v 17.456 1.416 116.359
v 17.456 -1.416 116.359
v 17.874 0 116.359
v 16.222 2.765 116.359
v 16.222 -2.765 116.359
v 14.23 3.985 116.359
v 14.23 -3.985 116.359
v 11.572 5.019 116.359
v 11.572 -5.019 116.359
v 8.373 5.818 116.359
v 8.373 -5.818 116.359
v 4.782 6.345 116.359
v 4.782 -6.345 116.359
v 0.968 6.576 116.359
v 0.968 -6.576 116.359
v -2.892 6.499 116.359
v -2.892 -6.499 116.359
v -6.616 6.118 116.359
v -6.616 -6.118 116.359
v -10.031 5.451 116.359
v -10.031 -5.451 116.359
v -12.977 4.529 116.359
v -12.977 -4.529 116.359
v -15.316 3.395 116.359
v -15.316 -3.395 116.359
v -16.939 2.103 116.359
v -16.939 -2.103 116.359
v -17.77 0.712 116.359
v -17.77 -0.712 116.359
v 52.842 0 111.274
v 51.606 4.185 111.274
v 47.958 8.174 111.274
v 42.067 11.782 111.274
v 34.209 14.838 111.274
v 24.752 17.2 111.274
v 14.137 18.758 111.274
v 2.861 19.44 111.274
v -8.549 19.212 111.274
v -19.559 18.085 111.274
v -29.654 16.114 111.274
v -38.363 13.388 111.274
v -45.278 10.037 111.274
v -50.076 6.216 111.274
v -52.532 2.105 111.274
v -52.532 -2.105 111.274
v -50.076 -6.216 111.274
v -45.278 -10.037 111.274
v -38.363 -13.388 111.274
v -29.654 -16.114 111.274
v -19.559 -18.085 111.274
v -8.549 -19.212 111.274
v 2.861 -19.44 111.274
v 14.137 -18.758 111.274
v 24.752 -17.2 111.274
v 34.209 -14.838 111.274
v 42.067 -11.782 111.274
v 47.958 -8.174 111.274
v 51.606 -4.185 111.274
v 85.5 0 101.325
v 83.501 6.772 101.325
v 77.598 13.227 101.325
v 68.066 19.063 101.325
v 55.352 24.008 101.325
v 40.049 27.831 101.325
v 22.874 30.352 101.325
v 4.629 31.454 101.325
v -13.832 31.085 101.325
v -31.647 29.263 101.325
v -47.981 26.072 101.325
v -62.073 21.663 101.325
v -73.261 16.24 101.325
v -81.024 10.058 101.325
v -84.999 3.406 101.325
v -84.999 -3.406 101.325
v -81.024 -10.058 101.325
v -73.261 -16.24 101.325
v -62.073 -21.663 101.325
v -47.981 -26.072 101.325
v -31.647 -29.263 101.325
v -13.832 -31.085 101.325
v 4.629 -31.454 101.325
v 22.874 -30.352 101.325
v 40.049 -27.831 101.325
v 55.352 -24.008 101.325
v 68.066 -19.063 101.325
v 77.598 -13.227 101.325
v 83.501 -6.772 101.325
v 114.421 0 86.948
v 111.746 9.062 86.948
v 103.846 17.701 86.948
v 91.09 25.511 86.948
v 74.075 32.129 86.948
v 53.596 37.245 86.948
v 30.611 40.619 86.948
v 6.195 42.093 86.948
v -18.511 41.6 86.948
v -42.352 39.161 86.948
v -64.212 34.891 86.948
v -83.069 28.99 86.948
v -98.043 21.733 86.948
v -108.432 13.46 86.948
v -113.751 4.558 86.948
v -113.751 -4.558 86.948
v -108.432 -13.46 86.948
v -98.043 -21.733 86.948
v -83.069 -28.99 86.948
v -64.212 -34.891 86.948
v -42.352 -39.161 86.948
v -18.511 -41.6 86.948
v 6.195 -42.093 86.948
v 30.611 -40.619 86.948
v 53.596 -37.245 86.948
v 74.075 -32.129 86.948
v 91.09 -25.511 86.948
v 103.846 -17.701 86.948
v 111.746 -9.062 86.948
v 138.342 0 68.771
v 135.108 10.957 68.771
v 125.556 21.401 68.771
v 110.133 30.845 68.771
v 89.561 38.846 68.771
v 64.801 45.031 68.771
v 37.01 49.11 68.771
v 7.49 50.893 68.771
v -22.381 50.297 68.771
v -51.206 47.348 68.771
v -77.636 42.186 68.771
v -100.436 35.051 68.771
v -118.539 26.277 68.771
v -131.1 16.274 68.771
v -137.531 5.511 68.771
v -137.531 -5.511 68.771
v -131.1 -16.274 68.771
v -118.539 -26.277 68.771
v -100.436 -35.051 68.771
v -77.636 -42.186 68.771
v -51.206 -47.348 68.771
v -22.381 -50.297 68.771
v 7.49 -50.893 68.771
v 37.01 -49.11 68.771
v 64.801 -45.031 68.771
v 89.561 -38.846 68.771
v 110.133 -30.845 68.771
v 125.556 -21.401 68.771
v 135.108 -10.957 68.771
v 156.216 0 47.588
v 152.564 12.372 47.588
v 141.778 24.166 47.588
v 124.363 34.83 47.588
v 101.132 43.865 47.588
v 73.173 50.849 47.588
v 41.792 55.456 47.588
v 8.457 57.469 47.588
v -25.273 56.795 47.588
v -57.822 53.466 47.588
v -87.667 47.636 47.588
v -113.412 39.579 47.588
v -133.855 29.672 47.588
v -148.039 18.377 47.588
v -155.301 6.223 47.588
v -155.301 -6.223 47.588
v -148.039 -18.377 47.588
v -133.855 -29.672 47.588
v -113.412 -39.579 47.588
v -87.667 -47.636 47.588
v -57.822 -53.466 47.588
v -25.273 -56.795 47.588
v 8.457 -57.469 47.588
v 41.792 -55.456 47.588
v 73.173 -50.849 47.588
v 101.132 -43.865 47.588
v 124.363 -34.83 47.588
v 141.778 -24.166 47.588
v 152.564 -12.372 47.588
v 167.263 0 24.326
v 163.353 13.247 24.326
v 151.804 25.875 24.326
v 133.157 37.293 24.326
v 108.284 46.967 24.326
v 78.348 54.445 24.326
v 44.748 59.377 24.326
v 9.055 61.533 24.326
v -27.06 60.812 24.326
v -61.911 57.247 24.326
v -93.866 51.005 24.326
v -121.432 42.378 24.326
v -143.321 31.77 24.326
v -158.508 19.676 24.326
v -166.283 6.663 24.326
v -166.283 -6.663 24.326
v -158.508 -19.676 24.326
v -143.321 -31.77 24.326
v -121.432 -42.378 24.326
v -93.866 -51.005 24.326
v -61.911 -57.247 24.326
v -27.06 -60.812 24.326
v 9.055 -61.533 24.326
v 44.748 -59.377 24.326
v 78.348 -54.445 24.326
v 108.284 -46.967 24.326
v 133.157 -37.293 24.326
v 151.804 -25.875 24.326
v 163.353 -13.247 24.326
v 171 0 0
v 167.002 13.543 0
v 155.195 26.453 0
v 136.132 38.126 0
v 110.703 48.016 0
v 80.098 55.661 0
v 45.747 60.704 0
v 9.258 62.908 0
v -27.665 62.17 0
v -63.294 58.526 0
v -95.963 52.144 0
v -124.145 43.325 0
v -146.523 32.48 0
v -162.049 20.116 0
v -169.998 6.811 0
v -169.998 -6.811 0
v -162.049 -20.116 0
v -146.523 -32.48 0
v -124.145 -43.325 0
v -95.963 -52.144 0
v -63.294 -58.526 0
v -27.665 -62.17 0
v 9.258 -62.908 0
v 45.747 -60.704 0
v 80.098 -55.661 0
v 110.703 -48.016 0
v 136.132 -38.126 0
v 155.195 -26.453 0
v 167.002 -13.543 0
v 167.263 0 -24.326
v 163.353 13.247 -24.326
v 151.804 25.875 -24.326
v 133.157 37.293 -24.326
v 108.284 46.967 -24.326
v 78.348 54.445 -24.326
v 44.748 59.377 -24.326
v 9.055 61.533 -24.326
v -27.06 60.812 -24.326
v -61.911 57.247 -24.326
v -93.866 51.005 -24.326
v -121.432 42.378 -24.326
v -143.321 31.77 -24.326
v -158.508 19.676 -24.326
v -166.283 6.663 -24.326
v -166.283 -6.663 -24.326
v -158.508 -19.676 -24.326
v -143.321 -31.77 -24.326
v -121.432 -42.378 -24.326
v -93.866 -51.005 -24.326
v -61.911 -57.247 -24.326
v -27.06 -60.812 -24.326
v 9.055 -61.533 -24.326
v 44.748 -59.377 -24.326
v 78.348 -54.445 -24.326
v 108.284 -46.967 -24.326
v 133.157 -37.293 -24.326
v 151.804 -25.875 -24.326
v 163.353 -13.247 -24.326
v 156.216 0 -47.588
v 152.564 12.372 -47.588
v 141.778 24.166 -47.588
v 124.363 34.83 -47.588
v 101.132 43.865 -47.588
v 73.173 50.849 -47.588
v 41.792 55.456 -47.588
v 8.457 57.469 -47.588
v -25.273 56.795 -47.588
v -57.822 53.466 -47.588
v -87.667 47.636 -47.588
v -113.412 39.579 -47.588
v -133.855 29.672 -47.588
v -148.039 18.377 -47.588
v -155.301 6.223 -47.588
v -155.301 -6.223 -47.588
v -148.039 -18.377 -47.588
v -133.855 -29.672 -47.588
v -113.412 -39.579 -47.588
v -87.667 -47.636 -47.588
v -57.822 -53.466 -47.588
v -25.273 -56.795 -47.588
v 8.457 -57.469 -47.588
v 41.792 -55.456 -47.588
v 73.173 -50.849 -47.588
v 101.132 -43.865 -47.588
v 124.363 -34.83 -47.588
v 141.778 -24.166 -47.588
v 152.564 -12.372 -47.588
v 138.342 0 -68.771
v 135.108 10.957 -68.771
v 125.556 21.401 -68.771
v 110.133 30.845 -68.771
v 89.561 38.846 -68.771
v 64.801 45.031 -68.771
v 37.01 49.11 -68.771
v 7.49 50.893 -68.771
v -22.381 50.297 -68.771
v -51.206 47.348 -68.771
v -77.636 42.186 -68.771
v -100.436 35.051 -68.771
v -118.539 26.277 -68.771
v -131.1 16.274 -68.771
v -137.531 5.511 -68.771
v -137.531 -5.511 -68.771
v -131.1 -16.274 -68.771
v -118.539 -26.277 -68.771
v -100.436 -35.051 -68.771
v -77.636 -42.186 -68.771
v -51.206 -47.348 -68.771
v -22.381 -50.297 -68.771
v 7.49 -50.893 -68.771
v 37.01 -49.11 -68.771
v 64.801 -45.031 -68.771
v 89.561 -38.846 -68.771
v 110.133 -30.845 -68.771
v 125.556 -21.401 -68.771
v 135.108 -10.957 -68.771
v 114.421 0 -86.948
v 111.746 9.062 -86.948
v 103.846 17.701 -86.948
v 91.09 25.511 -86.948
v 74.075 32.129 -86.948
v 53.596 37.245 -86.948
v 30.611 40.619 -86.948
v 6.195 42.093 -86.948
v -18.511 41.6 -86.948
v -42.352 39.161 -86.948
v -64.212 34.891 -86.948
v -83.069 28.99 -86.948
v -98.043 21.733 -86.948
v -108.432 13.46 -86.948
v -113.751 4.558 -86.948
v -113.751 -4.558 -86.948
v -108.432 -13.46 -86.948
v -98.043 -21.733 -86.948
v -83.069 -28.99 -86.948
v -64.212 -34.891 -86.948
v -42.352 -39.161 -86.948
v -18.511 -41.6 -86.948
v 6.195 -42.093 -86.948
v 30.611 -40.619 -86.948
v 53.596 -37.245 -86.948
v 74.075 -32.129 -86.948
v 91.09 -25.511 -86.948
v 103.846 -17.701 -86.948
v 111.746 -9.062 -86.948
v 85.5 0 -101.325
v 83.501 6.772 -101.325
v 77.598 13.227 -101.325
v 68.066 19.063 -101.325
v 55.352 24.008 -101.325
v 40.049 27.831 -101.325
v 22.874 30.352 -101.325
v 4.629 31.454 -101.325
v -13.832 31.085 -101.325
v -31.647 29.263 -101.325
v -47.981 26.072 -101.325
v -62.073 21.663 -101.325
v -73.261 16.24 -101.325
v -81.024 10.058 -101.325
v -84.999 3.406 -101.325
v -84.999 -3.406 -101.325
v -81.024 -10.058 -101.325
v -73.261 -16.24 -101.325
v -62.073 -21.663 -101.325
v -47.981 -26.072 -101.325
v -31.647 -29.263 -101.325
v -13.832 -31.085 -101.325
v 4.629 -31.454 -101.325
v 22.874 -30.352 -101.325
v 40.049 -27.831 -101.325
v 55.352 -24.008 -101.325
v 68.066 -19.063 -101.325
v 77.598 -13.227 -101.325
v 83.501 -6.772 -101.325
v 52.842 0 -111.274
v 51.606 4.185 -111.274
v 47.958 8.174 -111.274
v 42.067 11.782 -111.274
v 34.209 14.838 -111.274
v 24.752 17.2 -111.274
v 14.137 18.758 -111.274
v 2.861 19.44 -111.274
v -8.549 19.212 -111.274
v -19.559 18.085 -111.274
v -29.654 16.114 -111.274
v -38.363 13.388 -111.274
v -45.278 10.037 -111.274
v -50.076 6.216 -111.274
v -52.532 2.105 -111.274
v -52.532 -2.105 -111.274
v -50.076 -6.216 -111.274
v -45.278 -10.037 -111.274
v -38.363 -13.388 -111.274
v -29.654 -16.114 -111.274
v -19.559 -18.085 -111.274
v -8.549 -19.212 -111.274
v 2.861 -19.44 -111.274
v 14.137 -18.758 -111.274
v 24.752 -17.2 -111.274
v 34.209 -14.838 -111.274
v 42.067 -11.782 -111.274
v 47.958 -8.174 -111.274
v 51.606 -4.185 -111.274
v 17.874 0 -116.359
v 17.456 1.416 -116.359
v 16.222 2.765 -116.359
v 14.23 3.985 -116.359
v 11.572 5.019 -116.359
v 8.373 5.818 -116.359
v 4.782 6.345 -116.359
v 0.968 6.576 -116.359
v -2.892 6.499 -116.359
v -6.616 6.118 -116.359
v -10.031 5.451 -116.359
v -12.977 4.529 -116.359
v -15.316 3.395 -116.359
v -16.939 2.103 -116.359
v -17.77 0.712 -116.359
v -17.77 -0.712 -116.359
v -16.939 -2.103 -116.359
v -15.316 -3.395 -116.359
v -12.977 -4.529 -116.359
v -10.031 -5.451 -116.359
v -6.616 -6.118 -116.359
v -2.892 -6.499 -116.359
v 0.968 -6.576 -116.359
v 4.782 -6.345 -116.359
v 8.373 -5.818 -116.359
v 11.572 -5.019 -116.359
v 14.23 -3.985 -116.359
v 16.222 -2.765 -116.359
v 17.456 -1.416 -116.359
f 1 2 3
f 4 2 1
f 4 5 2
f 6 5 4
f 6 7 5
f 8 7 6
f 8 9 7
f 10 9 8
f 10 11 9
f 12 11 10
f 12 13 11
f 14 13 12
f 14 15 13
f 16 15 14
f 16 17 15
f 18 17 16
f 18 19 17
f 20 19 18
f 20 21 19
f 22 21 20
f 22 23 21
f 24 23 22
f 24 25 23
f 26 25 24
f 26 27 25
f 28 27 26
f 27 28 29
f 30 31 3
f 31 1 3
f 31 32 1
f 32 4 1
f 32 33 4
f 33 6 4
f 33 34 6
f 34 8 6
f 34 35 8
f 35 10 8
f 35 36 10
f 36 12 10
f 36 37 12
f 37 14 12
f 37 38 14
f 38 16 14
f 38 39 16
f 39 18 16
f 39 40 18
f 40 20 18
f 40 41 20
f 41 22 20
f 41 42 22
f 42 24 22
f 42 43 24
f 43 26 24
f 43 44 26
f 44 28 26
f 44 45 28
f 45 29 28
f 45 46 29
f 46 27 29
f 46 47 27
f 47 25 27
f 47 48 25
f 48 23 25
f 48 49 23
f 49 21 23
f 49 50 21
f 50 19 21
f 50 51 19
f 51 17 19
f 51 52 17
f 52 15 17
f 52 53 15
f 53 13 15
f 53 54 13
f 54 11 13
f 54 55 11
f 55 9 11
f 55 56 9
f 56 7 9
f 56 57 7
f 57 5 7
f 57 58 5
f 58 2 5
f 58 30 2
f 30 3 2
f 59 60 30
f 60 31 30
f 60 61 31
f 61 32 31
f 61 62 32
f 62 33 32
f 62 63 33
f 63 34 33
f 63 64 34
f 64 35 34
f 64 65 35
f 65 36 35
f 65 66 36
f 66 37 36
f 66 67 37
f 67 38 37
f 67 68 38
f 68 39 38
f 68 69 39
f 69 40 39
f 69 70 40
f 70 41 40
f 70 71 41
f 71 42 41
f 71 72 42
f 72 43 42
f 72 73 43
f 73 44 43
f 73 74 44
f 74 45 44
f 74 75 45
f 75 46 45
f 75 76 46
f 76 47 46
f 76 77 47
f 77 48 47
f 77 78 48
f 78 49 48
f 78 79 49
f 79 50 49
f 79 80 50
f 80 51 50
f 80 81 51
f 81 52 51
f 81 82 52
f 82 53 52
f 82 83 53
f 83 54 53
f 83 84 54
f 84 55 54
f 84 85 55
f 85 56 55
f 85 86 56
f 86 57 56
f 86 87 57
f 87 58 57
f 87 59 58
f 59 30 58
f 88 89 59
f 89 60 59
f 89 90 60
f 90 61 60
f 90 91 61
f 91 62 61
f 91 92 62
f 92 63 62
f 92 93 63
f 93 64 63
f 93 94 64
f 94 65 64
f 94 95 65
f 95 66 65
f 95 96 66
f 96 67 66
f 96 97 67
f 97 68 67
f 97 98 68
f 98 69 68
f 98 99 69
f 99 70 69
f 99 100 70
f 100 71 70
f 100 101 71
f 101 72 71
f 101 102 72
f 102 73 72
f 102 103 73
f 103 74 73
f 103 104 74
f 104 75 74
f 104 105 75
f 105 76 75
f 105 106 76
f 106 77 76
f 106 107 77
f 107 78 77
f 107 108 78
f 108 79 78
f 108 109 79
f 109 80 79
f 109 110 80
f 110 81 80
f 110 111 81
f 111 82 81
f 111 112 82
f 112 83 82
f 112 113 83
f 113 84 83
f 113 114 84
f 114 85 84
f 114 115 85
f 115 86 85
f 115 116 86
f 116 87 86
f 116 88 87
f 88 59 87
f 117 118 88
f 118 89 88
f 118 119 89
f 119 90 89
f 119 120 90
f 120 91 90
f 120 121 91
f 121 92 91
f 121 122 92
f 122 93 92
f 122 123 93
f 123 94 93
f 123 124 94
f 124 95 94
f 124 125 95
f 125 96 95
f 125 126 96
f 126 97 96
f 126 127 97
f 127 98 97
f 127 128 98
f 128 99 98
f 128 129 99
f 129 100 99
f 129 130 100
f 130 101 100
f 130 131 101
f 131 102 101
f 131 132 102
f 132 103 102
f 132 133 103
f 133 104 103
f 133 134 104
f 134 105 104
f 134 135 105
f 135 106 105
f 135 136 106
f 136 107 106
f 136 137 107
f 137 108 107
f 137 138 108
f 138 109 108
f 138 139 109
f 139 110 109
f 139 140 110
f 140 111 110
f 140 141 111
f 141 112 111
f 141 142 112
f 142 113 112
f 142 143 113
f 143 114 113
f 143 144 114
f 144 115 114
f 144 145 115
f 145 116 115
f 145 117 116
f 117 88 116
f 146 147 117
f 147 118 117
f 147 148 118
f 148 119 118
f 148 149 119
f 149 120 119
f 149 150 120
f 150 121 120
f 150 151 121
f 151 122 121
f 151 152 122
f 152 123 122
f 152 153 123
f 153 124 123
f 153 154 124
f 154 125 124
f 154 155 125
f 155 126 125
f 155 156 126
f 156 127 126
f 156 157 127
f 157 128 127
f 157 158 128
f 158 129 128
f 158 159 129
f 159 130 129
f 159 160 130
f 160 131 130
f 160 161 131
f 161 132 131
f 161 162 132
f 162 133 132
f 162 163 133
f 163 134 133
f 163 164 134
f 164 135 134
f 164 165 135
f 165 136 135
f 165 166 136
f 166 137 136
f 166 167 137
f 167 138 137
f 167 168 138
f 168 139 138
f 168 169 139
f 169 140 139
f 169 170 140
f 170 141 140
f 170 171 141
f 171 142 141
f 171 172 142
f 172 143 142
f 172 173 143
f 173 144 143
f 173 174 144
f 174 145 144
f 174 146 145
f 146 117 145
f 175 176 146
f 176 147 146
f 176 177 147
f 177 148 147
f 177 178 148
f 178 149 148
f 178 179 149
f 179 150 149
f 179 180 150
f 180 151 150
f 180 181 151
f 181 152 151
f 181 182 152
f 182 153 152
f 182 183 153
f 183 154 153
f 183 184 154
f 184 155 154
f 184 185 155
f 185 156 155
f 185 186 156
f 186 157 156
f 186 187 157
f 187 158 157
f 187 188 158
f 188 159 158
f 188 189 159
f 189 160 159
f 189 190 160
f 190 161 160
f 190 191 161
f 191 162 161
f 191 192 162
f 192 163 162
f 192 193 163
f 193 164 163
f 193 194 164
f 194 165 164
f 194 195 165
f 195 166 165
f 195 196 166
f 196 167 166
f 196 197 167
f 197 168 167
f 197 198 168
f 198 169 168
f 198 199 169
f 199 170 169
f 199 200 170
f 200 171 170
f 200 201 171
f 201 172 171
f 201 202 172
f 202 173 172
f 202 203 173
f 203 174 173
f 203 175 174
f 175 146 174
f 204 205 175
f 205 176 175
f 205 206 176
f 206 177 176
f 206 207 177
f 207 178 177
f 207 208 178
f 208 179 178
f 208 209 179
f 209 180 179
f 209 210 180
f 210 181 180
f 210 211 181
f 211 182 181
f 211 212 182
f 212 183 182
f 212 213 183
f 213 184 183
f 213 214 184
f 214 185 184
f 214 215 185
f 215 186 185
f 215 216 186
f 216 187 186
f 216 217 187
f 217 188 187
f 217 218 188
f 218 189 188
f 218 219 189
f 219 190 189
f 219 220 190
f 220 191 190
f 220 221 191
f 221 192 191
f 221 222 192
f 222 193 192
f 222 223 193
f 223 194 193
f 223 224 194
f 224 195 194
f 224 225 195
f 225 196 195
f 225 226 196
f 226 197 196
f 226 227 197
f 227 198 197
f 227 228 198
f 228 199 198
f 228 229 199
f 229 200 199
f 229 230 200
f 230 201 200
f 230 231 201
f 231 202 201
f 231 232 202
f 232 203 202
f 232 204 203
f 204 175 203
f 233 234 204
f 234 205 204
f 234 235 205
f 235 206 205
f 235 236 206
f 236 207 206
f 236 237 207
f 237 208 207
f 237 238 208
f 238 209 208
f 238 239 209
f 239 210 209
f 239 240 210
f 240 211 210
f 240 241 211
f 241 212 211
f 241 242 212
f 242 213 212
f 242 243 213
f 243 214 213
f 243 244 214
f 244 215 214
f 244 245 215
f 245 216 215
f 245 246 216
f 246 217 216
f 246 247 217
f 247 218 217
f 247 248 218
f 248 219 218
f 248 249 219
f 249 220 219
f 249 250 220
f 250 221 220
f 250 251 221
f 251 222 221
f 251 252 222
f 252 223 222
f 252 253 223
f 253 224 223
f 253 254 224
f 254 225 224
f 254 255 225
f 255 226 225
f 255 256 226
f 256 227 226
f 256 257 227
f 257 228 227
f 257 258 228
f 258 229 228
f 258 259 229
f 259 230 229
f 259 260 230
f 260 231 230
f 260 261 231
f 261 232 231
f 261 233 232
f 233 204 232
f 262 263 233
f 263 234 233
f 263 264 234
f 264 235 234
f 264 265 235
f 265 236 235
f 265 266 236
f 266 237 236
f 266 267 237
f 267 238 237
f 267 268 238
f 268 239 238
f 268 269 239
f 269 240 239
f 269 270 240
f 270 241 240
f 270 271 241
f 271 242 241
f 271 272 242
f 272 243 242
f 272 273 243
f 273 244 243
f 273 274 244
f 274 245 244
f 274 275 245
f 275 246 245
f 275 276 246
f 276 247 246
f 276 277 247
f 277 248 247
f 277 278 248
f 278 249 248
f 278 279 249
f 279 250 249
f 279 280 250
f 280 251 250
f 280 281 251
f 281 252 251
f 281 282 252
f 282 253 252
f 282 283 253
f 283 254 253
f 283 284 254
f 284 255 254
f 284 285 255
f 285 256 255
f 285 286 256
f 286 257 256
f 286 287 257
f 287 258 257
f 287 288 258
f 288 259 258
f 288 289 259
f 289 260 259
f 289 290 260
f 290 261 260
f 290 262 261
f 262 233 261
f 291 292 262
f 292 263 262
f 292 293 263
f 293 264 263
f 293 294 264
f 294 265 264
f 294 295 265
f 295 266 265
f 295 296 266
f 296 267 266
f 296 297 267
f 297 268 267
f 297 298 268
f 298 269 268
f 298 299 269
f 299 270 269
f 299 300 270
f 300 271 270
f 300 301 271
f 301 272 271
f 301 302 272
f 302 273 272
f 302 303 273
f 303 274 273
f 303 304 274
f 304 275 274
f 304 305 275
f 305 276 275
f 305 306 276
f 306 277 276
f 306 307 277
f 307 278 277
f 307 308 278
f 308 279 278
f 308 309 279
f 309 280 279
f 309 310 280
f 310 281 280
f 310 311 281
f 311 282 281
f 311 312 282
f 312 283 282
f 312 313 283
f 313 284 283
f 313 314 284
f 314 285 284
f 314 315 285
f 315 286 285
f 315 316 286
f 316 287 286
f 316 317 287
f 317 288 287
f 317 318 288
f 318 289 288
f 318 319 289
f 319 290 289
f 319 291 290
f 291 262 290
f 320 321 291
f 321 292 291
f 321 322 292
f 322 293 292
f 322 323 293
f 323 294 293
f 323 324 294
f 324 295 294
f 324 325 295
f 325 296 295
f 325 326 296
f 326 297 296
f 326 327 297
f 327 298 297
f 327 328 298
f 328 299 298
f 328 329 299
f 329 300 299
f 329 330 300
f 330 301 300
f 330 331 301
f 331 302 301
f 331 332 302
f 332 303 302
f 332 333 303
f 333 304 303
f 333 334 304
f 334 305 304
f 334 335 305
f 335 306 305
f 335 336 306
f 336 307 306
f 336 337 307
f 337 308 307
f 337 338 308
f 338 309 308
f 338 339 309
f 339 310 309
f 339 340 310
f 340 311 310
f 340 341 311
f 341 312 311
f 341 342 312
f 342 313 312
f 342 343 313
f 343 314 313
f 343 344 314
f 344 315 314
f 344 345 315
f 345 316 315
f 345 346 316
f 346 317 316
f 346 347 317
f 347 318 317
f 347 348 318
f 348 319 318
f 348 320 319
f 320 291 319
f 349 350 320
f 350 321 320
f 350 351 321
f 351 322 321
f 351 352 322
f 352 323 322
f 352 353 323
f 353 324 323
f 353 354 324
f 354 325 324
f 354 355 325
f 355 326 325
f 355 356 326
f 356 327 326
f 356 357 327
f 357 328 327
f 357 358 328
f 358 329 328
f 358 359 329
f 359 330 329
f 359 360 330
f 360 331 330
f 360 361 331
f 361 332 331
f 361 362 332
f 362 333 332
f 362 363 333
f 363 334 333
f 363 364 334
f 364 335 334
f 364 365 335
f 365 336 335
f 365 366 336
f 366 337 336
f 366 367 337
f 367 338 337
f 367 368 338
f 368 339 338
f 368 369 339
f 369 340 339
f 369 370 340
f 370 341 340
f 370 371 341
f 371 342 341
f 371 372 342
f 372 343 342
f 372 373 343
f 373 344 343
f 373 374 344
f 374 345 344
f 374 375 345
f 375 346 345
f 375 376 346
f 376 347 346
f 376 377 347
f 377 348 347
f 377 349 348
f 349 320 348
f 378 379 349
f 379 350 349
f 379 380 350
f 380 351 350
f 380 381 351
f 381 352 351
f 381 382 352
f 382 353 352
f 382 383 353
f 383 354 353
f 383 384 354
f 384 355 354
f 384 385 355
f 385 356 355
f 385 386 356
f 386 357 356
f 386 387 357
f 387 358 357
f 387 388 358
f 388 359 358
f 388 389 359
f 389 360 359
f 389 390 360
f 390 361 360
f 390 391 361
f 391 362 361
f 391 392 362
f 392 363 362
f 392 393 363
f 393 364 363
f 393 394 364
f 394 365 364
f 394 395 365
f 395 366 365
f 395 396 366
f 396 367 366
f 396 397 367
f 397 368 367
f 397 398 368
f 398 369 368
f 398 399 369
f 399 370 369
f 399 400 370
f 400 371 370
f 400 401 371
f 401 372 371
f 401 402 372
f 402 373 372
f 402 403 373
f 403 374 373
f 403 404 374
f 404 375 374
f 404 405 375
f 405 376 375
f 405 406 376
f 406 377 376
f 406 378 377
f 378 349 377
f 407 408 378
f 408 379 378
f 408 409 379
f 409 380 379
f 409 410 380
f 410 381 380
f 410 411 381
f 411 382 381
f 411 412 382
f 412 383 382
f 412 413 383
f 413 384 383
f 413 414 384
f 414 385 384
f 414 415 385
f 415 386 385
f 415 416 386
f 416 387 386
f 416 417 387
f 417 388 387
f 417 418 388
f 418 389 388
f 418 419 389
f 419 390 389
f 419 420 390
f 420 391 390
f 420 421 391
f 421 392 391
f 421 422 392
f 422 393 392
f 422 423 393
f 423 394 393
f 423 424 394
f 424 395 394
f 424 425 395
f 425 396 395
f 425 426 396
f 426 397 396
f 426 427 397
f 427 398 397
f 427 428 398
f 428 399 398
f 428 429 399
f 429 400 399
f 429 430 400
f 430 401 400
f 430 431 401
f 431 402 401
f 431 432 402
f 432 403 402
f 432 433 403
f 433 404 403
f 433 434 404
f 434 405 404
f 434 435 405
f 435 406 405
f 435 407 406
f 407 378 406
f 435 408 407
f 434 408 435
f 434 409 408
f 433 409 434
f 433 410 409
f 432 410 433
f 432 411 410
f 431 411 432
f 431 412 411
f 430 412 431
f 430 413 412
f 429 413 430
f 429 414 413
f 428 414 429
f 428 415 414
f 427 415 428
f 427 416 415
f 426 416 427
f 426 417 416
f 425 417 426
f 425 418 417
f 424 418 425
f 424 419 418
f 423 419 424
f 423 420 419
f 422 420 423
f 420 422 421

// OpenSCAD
// Generated by SolidPython 1.0.1 on 2020-07-29 00:46:53


scale(v = [19, 7, 13]) {
	sphere(r = 9);
}
/***********************************************
*********      SolidPython code:      **********
************************************************
 
# import packages: SolidPython
from solid import *
from solid.utils import *
from itertools import chain, combinations, permutations


class Resize:

    def __init__(self, scad_file):
        self.scad_file = scad_file
        #self.scad_file = import_scad(scad_file)
        # cone/cylinder param:
        self.r1 = 0
        self.r2 = 0
        self.h = 0
        # rectangular prism param:
        self.w = 0
        self.l = 0
        # ellipse param:
        self.r = 0

    # import OpenScad code (file name corresponds to shape)


    # classify shape + parameters
    def assign(self, param1, param2, param3):
        if self.scad_file == 'cone.scad':
            self.r1 = param1
            self.r2 = param2
            self.h = param3
        elif self.scad_file == 'cylinder.scad':
            self.r1 = param1
            self.r2 = param2
            self.h = param3
        elif self.scad_file == 'rectangularPrism.scad':
            self.h = param1
            self.l = param2
            self.w = param3
        else:
            self.r = param1
            self.h = param2

    # resize parameters
    def iterate(self):
        x = range(3, 20, 2)
        i = 1
        if self.scad_file == 'cone.scad':
            tempList = list(permutations(x, 2))
            for temp in tempList:
                param1 = temp[0]
                param2 = temp[1]
                filepath = 'produced_scad_files/' + 'cone' + str(param1) + '_' + str(param2) + '_' + '.scad'
                scad_render_to_file(cylinder(h=param1, r1=param2, r2=0), filepath)

        elif self.scad_file == 'cylinder.scad':
            tempList = list(permutations(x, 3))
            for temp in tempList:
                param1 = temp[0]
                param2 = temp[1]
                filepath = 'produced_scad_files/' + 'cylinder' + str(param1) + '_' + str(param2) + '_' + '.scad'
                scad_render_to_file(cylinder(h=param1, r1=param2, r2=param2), filepath)

        elif self.scad_file == 'rectangularPrism.scad':
            tempList = list(permutations(x, 3))
            for temp in tempList:
                param1 = temp[0]
                param2 = temp[1]
                param3 = temp[2]
                filepath = 'produced_scad_files/' + 'rectangularPrism' + str(param1) + '_' + str(param2) + '_' + str(
                    param3) + '.scad'
                scad_render_to_file(cube(size=(param1, param2, param3)), filepath)

        elif self.scad_file == 'ellipse.scad':
            tempList = list(permutations(x, 4))
            for temp in tempList:
                param1 = temp[0]
                param2 = temp[1]
                param3 = temp[2]
                param4 = temp[3]
                filepath = 'produced_scad_files/' + 'ellipse' + str(param1) + '_' + str(param2) + '_' + str(param3) + '_' + str(param4) + '.scad'
                scad_render_to_file(scale([param1, param2, param3])(sphere(r=param4)), filepath)

    def render_to_scadfile(self):
        scad_render_to_file(scad, 'example.scad') 
 
************************************************/
